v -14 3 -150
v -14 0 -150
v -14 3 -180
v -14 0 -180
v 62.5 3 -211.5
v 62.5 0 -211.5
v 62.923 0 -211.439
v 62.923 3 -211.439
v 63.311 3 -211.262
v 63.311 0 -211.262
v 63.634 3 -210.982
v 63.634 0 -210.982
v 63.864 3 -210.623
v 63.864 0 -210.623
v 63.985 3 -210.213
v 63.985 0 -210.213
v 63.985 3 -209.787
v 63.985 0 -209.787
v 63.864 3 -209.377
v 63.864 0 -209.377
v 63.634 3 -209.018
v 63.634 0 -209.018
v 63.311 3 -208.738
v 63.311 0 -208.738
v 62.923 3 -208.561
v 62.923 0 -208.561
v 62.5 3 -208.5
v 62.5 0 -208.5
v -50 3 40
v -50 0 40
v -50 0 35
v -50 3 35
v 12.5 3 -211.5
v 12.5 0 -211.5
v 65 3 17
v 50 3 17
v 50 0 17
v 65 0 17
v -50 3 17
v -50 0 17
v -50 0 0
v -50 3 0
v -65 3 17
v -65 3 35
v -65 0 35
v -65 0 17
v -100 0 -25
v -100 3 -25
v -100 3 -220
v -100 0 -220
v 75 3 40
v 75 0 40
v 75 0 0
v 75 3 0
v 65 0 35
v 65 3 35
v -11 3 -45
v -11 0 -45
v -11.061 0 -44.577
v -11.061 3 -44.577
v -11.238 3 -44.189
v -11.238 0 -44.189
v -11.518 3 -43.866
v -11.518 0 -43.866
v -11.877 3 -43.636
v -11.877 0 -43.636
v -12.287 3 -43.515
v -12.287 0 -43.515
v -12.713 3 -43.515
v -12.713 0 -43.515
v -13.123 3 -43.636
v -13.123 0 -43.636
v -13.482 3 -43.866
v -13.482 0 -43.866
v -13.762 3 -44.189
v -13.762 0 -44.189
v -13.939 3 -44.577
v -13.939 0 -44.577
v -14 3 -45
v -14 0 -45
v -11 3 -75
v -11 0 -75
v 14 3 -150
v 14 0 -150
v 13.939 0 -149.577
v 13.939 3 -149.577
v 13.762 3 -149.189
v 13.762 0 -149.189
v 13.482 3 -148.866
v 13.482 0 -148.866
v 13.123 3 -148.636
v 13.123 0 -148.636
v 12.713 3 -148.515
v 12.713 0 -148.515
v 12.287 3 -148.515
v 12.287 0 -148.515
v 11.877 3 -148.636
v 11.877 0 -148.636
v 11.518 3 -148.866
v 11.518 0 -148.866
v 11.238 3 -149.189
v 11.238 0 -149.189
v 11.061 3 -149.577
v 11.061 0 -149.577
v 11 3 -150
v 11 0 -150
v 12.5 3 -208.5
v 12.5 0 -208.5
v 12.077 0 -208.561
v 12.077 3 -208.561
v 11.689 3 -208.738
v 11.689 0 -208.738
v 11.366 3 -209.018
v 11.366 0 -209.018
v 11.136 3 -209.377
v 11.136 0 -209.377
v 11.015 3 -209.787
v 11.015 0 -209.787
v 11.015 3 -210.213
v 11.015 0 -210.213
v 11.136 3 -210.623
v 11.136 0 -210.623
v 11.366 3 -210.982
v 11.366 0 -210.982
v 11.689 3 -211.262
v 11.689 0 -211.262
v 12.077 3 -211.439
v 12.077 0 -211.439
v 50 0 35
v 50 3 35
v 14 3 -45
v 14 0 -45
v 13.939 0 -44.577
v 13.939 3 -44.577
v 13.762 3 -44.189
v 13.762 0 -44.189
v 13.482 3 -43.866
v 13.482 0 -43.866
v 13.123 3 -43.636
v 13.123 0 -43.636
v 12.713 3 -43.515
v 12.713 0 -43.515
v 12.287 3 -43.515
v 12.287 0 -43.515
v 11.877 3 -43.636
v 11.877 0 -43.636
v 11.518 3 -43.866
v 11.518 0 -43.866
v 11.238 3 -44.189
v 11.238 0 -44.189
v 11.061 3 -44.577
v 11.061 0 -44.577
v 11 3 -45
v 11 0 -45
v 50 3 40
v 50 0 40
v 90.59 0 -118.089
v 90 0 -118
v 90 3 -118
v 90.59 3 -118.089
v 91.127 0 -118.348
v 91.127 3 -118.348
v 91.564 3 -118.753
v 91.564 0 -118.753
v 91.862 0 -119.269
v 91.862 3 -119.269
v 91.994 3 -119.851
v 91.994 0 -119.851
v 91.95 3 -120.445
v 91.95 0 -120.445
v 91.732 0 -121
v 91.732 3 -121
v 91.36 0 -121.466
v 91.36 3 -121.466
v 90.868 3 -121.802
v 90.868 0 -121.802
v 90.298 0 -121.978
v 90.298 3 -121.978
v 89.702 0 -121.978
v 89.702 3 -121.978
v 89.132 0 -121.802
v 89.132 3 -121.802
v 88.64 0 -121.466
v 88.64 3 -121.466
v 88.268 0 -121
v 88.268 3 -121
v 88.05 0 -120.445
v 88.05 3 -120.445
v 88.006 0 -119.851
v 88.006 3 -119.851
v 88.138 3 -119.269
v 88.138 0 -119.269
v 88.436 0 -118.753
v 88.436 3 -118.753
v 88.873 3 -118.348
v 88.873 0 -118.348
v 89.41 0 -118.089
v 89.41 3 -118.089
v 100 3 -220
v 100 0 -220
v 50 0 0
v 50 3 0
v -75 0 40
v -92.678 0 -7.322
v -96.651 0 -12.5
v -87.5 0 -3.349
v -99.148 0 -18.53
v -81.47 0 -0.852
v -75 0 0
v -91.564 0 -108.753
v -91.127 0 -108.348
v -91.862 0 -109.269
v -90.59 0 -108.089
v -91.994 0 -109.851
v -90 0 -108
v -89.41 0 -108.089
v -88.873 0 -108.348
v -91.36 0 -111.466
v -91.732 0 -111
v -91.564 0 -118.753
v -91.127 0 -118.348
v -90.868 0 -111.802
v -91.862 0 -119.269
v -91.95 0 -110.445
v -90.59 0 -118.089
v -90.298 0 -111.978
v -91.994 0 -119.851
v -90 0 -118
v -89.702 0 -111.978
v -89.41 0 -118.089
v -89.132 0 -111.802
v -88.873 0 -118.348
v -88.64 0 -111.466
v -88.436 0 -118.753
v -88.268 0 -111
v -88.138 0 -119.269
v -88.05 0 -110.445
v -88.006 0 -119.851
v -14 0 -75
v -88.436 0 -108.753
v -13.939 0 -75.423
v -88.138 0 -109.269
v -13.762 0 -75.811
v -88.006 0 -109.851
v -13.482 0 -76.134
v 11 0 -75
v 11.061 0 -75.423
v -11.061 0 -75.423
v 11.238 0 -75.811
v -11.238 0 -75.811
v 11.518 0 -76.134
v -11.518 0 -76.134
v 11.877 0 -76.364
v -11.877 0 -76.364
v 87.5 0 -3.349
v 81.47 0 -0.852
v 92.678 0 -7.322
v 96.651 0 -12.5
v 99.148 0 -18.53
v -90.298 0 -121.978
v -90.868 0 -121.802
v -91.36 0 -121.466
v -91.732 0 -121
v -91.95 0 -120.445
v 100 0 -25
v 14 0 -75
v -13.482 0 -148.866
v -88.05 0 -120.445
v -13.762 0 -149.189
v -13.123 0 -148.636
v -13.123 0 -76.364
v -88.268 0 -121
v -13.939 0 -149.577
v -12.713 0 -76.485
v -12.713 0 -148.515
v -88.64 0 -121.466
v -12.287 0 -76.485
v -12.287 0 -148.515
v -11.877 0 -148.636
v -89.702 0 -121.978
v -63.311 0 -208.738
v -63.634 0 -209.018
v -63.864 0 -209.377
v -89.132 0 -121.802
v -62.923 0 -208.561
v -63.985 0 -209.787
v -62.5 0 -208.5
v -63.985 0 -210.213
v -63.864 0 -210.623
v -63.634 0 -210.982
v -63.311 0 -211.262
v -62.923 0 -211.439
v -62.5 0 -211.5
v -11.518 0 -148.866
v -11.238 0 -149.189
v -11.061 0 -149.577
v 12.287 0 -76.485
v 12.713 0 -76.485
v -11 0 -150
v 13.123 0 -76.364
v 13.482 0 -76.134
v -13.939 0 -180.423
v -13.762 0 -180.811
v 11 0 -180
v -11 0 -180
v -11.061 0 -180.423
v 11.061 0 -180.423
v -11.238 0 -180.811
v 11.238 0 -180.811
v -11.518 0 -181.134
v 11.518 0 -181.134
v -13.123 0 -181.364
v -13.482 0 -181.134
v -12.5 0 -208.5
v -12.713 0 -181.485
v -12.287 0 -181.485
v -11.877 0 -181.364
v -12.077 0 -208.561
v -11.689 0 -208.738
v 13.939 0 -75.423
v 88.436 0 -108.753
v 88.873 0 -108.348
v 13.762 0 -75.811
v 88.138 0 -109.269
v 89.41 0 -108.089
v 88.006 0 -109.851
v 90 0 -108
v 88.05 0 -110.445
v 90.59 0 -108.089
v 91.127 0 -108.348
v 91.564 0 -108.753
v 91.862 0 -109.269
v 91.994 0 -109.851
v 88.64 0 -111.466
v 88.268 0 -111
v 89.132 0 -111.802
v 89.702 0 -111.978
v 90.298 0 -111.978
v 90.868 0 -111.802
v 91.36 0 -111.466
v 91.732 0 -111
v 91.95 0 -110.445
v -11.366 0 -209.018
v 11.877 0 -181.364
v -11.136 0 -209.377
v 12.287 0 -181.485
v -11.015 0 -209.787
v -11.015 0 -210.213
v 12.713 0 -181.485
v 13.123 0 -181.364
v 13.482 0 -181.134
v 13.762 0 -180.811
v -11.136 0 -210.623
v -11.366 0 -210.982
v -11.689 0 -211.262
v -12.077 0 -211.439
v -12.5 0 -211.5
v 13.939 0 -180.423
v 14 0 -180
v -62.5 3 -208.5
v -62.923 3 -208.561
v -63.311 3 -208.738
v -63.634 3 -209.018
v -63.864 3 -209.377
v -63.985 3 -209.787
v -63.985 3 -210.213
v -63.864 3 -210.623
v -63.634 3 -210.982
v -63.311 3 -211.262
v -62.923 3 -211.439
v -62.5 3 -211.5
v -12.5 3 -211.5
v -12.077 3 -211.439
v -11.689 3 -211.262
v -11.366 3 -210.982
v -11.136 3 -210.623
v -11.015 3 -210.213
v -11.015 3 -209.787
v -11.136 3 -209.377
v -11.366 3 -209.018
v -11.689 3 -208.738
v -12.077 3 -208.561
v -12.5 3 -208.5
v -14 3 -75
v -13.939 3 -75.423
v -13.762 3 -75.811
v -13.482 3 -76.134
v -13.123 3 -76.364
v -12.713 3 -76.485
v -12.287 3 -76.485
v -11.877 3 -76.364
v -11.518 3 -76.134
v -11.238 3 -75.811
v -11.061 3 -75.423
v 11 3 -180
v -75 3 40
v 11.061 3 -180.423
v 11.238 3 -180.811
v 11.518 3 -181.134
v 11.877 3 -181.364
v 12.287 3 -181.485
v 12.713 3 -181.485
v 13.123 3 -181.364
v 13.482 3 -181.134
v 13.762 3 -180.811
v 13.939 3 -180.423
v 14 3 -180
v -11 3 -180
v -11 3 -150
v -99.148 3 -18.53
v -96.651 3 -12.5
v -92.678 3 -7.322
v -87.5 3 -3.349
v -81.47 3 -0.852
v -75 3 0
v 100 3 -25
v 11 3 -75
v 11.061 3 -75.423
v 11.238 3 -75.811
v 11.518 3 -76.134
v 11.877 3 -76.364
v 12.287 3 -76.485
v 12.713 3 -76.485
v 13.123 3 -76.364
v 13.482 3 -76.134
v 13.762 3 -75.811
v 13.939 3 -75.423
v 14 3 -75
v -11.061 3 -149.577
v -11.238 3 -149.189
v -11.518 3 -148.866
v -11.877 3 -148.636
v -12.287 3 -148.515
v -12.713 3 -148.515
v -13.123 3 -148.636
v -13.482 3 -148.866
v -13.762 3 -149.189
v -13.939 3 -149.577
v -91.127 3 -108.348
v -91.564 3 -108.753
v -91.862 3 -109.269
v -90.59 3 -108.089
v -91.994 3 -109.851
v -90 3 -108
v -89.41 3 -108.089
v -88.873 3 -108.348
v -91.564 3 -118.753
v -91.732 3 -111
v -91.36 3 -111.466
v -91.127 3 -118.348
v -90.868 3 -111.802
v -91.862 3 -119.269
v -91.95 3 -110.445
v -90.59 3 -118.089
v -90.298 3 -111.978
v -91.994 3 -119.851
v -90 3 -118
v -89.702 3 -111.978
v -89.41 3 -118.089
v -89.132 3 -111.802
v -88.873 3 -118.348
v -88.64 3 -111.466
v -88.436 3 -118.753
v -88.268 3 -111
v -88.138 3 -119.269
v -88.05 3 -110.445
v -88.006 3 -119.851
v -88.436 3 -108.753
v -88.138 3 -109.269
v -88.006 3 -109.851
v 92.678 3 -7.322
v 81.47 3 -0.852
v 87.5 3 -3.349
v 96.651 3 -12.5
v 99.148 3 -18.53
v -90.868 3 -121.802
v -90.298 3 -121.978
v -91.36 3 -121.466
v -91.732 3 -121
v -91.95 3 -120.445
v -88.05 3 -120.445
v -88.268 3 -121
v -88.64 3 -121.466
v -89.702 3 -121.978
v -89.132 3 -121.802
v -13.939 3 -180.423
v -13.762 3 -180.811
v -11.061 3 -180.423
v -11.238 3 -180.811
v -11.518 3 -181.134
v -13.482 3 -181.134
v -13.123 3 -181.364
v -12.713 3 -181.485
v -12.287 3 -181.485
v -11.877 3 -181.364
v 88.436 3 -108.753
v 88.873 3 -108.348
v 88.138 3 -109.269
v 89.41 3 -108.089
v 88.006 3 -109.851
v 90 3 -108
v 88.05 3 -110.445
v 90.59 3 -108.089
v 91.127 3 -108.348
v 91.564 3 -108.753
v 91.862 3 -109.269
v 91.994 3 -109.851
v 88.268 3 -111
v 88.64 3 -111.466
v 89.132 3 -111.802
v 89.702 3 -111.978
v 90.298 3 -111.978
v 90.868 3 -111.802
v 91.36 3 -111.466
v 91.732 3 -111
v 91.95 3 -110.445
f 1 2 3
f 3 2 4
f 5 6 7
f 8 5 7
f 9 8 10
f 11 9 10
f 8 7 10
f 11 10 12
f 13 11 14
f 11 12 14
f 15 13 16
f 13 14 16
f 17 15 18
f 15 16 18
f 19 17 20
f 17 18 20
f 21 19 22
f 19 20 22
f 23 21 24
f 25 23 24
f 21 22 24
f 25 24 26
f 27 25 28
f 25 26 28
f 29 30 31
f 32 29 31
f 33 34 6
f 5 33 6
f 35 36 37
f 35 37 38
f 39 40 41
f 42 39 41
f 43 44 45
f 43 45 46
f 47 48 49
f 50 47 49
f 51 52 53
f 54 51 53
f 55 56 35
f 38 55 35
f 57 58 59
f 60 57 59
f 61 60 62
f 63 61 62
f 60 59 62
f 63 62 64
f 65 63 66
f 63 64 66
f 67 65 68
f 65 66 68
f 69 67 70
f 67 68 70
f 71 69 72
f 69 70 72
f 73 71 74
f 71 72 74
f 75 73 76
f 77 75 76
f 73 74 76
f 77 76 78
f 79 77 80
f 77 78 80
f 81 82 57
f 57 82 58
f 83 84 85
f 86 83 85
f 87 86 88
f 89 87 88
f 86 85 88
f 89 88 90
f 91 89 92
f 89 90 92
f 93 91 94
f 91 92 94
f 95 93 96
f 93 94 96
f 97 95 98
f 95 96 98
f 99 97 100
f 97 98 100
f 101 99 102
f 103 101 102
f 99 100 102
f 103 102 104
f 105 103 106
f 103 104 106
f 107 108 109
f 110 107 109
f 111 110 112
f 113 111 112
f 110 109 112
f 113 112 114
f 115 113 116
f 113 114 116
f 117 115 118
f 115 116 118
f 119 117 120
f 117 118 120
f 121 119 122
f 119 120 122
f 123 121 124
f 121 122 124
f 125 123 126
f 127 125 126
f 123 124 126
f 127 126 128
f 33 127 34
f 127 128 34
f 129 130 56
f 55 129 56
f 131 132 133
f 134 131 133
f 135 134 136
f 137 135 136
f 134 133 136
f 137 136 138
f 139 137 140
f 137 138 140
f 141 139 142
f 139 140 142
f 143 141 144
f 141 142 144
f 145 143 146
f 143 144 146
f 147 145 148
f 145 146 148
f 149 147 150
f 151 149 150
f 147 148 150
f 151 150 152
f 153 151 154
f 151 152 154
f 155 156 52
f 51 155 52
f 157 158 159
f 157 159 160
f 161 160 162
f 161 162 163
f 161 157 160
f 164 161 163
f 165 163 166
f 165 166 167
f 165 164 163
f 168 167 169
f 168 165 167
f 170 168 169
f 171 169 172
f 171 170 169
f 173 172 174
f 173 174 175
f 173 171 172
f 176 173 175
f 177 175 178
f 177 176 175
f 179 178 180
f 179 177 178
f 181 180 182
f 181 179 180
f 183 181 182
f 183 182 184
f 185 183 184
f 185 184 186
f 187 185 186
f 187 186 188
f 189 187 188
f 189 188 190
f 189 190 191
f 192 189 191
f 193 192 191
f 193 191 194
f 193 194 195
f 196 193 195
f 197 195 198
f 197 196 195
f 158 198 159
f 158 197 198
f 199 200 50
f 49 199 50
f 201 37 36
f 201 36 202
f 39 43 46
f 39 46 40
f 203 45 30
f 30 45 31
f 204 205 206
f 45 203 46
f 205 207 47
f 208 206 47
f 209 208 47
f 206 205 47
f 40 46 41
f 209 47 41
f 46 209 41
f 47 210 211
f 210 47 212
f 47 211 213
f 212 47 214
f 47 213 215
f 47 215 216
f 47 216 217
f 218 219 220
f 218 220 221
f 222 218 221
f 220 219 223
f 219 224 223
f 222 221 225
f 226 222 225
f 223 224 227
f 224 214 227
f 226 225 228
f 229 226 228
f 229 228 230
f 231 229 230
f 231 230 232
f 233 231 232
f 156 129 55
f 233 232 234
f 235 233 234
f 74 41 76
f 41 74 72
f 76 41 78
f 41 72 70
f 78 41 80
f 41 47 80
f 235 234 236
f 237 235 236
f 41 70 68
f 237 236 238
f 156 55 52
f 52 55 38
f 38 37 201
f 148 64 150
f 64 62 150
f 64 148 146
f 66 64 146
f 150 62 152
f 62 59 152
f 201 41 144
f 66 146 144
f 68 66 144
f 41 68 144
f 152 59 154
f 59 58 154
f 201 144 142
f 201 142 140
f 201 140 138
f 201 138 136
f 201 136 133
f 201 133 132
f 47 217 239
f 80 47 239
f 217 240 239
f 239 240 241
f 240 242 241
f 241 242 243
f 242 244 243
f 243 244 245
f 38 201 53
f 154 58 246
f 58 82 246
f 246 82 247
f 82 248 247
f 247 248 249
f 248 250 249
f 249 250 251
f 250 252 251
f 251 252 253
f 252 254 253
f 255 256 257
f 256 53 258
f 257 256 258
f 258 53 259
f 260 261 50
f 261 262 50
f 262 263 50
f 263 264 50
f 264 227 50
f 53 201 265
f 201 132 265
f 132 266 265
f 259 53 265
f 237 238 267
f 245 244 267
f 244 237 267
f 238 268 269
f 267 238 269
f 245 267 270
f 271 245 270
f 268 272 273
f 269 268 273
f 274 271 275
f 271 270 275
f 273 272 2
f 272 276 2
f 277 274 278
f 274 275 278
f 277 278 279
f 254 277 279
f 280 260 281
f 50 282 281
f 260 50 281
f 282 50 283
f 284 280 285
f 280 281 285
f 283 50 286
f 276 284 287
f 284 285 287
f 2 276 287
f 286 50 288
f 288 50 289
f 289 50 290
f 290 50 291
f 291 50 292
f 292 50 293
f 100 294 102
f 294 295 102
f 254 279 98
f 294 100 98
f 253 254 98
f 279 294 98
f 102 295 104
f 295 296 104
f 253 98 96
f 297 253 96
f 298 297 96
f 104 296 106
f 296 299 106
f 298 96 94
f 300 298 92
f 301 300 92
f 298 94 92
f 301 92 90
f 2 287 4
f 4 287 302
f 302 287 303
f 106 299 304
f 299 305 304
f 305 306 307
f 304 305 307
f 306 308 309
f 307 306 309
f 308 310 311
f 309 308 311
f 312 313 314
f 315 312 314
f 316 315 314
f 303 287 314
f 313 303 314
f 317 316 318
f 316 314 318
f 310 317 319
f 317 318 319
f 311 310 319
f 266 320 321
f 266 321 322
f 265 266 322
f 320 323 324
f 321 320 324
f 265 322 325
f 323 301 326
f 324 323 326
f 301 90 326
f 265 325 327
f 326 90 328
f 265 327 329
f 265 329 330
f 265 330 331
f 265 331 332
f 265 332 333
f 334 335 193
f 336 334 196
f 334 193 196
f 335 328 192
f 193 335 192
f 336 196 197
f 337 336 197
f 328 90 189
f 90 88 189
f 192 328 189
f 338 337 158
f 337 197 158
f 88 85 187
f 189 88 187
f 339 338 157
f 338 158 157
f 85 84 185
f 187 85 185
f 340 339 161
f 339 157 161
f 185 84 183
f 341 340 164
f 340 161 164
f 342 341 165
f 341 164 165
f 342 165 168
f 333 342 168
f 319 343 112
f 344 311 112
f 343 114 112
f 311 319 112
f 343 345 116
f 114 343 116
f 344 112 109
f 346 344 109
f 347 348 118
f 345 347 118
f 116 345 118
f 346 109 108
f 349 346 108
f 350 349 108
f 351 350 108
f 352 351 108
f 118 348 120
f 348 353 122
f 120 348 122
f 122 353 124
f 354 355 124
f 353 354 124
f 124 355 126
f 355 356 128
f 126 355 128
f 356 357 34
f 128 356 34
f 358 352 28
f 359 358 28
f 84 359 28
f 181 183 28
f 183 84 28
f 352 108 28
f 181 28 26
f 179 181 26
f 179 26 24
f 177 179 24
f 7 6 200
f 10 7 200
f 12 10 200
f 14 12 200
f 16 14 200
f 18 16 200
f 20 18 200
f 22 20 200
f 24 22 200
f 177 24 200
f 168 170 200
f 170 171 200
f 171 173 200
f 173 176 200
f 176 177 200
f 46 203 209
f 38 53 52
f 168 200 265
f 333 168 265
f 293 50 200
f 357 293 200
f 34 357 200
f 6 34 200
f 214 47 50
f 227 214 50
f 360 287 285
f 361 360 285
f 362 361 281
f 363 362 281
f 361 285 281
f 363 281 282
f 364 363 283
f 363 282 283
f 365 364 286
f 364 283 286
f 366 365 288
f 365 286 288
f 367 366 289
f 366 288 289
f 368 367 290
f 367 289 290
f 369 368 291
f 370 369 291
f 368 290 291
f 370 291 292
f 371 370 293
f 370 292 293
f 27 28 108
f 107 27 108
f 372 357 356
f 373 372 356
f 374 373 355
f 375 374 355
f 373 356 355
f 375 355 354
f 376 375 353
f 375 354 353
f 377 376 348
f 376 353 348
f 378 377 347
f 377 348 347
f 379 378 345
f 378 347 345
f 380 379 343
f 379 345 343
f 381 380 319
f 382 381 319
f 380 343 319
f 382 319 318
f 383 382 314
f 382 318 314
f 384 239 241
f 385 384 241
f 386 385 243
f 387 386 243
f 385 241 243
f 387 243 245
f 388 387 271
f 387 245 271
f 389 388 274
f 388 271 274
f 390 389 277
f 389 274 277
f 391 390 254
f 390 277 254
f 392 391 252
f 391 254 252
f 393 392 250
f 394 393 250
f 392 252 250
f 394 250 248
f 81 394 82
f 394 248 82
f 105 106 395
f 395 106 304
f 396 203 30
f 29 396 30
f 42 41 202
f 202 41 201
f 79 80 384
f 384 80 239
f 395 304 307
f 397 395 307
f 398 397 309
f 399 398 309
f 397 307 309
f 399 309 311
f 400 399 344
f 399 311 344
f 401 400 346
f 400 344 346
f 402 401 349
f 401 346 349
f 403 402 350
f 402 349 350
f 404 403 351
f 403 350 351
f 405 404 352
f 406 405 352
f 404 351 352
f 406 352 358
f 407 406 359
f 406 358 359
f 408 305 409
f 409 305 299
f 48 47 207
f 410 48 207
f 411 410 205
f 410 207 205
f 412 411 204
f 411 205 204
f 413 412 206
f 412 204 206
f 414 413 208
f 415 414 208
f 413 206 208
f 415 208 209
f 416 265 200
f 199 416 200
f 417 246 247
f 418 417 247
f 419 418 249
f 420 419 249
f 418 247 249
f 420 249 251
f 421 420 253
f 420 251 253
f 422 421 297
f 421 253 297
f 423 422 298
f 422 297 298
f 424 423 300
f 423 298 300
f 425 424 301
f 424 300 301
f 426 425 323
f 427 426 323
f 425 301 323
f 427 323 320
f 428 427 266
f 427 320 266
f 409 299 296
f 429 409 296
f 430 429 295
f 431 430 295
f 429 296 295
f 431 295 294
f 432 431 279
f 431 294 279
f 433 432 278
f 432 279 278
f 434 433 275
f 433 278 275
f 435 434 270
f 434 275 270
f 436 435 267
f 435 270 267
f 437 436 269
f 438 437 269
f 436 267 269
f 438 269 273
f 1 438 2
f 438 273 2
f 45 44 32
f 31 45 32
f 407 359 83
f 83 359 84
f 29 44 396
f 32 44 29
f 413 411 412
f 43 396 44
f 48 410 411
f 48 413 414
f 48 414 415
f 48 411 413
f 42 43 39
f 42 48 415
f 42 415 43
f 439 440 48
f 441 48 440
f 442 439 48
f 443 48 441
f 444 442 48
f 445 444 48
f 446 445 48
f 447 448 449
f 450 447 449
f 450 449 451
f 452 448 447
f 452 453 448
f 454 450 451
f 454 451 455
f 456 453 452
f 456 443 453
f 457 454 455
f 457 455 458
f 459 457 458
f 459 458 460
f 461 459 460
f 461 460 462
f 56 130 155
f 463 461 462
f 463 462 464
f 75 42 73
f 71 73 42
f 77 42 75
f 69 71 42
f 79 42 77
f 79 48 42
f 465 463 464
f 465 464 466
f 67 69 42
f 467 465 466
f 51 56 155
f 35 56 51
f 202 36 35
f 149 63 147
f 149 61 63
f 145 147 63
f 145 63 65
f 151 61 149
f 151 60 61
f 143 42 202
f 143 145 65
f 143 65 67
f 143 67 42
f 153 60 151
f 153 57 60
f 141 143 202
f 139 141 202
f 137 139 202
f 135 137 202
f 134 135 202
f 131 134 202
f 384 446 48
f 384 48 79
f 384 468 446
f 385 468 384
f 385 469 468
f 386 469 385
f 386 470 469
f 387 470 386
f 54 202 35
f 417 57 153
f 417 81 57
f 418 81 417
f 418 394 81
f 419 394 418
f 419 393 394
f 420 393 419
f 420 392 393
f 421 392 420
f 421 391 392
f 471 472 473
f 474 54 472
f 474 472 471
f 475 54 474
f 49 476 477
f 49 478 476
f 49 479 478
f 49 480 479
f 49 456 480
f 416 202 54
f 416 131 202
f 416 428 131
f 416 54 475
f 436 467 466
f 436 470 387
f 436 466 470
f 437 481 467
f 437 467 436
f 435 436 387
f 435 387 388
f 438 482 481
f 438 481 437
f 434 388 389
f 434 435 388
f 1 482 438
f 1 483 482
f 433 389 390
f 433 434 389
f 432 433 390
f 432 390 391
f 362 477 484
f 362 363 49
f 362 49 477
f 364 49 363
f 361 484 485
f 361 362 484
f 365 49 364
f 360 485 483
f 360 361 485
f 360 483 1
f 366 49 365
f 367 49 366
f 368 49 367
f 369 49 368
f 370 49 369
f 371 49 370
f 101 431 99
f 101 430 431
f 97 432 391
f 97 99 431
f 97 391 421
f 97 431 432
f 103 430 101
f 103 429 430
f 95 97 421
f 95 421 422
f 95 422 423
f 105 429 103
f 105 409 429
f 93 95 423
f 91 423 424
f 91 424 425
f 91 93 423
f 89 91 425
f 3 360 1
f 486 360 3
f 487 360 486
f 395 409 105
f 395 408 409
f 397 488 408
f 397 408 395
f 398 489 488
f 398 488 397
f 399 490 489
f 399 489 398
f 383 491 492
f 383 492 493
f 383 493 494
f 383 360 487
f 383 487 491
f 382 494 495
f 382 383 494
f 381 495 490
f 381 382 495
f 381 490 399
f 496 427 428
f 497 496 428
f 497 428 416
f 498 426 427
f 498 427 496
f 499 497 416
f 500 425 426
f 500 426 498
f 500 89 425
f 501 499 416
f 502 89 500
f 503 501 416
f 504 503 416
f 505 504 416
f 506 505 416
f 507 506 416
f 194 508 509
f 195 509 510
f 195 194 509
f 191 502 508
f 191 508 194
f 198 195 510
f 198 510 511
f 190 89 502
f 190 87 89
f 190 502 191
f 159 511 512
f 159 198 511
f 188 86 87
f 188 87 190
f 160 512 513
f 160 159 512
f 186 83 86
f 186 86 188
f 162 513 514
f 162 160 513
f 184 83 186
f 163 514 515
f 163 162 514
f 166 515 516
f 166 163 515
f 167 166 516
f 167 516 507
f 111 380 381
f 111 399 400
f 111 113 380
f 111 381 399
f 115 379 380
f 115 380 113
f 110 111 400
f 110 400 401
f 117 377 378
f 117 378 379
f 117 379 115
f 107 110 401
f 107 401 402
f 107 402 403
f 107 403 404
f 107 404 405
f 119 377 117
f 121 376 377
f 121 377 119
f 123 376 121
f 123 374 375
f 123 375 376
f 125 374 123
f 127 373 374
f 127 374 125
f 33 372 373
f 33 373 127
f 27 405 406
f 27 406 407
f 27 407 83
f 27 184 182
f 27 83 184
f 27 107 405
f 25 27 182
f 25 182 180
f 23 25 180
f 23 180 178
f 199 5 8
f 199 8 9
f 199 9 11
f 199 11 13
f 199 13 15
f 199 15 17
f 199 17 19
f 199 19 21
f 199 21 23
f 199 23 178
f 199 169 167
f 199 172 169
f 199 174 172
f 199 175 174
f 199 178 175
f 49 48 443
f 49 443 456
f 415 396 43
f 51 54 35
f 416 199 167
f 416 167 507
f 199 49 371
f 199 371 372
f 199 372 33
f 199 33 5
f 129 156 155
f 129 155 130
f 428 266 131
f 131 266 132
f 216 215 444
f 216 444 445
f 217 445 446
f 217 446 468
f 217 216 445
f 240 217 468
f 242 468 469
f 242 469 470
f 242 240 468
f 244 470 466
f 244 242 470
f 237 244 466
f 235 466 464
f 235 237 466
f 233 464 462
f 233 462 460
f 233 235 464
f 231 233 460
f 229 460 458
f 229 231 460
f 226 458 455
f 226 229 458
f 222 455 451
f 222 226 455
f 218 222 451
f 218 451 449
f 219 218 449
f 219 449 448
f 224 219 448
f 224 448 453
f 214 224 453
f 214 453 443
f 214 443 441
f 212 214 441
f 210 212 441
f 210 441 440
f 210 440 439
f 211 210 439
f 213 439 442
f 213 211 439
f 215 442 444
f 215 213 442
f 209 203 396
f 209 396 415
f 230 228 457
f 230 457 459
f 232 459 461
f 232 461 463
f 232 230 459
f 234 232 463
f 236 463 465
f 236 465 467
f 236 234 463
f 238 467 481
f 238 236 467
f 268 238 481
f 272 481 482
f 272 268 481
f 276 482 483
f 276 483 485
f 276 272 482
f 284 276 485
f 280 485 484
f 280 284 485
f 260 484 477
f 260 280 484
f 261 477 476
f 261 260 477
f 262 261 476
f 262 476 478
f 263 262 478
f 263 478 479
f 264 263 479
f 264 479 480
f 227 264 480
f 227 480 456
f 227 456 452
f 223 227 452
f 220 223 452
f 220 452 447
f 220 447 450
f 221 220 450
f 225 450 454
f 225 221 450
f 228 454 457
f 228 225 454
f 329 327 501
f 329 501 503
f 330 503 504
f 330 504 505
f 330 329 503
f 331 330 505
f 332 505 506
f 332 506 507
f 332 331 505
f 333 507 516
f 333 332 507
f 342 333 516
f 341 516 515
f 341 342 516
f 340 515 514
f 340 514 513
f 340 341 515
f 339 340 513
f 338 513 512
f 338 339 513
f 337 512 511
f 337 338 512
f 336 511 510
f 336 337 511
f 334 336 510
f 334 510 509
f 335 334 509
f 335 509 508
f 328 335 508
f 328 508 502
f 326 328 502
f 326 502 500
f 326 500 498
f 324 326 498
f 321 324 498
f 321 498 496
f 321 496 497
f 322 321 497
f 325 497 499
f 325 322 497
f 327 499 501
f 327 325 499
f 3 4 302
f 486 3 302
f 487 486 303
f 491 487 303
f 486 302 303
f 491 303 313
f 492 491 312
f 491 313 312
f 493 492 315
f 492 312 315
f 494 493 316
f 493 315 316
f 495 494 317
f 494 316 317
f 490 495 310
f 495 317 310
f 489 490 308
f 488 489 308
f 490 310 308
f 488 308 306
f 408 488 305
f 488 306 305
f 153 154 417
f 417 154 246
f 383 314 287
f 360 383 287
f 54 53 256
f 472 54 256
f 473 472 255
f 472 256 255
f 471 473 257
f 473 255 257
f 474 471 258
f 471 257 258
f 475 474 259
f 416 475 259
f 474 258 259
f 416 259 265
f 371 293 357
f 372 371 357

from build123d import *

# Parameters (mm, degrees)
SKETCH1_R           = 2
BOSS_EXTRUDE1_DEPTH = 3
SKETCH1_3_W         = 25
SKETCH1_3_H         = 40
BOSS_EXTRUDE4_DEPTH = 3
SKETCH4_W           = 5
SKETCH4_H           = 18
CUT_EXTRUDE1_DEPTH  = 10
SKETCH5_W           = 10
SKETCH5_H           = 18
CUT_EXTRUDE2_DEPTH  = 10
SKETCH8_W           = 10
SKETCH8_H           = 18
CUT_EXTRUDE3_DEPTH  = 10
SKETCH9_W           = 10
SKETCH9_H           = 65
BOSS_EXTRUDE7_DEPTH = 3


with BuildPart() as part:
    # Sketch1 → Boss-Extrude1 (new body)
    with BuildSketch(Plane(origin=(0, 0, 0), x_dir=(1, 0, 0), z_dir=(0, 1, 0))):
        with BuildLine():
            ThreePointArc((-100, 25), (-92.67766953, 7.32233047), (-75, 0))
            Line((-75, 0), (-50, 0))
            Line((-50, 0), (50, 0))
            Line((50, 0), (75, 0))
            ThreePointArc((75, 0), (92.67766953, 7.32233047), (100, 25))
            Line((100, 25), (100, 135))
            Line((100, 135), (90, 135))
            Line((90, 135), (90, 200))
            Line((90, 200), (100, 200))
            Line((100, 200), (100, 220))
            Line((100, 220), (-100, 220))
            Line((-100, 220), (-100, 200))
            Line((-100, 200), (-90, 200))
            Line((-90, 200), (-90, 135))
            Line((-90, 135), (-100, 135))
            Line((-100, 135), (-100, 25))
        make_face()
        with BuildLine():
            Line((-14, 45), (-14, 75))
            ThreePointArc((-14, 75), (-12.5, 76.5), (-11, 75))
            Line((-11, 75), (-11, 45))
            ThreePointArc((-11, 45), (-12.5, 43.5), (-14, 45))
        make_face(mode=Mode.SUBTRACT)
        with BuildLine():
            ThreePointArc((11, 75), (12.5, 76.5), (14, 75))
            Line((14, 75), (14, 45))
            ThreePointArc((14, 45), (12.5, 43.5), (11, 45))
            Line((11, 45), (11, 75))
        make_face(mode=Mode.SUBTRACT)
        with Locations((-90, 110)):
            Circle(SKETCH1_R, mode=Mode.SUBTRACT)
        with Locations((-90, 120)):
            Circle(SKETCH1_R, mode=Mode.SUBTRACT)
        with BuildLine():
            Line((-14, 150), (-14, 180))
            ThreePointArc((-14, 180), (-12.5, 181.5), (-11, 180))
            Line((-11, 180), (-11, 150))
            ThreePointArc((-11, 150), (-12.5, 148.5), (-14, 150))
        make_face(mode=Mode.SUBTRACT)
        with BuildLine():
            Line((-62.5, 211.5), (-12.5, 211.5))
            ThreePointArc((-12.5, 211.5), (-11, 210), (-12.5, 208.5))
            Line((-12.5, 208.5), (-62.5, 208.5))
            ThreePointArc((-62.5, 208.5), (-64, 210), (-62.5, 211.5))
        make_face(mode=Mode.SUBTRACT)
        with Locations((90, 110)):
            Circle(SKETCH1_R, mode=Mode.SUBTRACT)
        with Locations((90, 120)):
            Circle(SKETCH1_R, mode=Mode.SUBTRACT)
        with BuildLine():
            ThreePointArc((11, 180), (12.5, 181.5), (14, 180))
            Line((14, 180), (14, 150))
            ThreePointArc((14, 150), (12.5, 148.5), (11, 150))
            Line((11, 150), (11, 180))
        make_face(mode=Mode.SUBTRACT)
        with BuildLine():
            ThreePointArc((12.5, 208.5), (11, 210), (12.5, 211.5))
            Line((12.5, 211.5), (62.5, 211.5))
            ThreePointArc((62.5, 211.5), (64, 210), (62.5, 208.5))
            Line((62.5, 208.5), (12.5, 208.5))
        make_face(mode=Mode.SUBTRACT)
    extrude(amount=BOSS_EXTRUDE1_DEPTH)

    # Sketch1<3> → Boss-Extrude4 (add)
    with BuildSketch(Plane(origin=(0, 0, 0), x_dir=(1, 0, 0), z_dir=(0, 1, 0))):
        with Locations((-62.5, -20)):
            Rectangle(SKETCH1_3_W, SKETCH1_3_H)
        with Locations((62.5, -20)):
            Rectangle(SKETCH1_3_W, SKETCH1_3_H)
    extrude(amount=BOSS_EXTRUDE4_DEPTH)

    # Sketch4 → Cut-Extrude1 (cut)
    with BuildSketch(Plane(origin=(0, 3, 0), x_dir=(1, 0, 0), z_dir=(0, 1, 0))):
        with Locations((-52.5, -26)):
            Rectangle(SKETCH4_W, SKETCH4_H)
        with Locations((52.5, -26)):
            Rectangle(SKETCH4_W, SKETCH4_H)
    extrude(amount=-CUT_EXTRUDE1_DEPTH, mode=Mode.SUBTRACT)

    # Sketch5 → Cut-Extrude2 (cut)
    with BuildSketch(Plane(origin=(0, 3, 0), x_dir=(1, 0, 0), z_dir=(0, 1, 0))):
        with Locations((60, -26)):
            Rectangle(SKETCH5_W, SKETCH5_H)
    extrude(amount=-CUT_EXTRUDE2_DEPTH, mode=Mode.SUBTRACT)

    # Sketch8 → Cut-Extrude3 (cut)
    with BuildSketch(Plane(origin=(0, 3, 0), x_dir=(1, 0, 0), z_dir=(0, 1, 0))):
        with Locations((-60, -26)):
            Rectangle(SKETCH8_W, SKETCH8_H)
    extrude(amount=-CUT_EXTRUDE3_DEPTH, mode=Mode.SUBTRACT)

    # Sketch9 → Boss-Extrude7 (add)
    with BuildSketch(Plane(origin=(0, 3, 0), x_dir=(1, 0, 0), z_dir=(0, 1, 0))):
        with Locations((-95, 167.5)):
            Rectangle(SKETCH9_W, SKETCH9_H)
        with Locations((95, 167.5)):
            Rectangle(SKETCH9_W, SKETCH9_H)
    extrude(amount=-BOSS_EXTRUDE7_DEPTH)


solid = part.part
